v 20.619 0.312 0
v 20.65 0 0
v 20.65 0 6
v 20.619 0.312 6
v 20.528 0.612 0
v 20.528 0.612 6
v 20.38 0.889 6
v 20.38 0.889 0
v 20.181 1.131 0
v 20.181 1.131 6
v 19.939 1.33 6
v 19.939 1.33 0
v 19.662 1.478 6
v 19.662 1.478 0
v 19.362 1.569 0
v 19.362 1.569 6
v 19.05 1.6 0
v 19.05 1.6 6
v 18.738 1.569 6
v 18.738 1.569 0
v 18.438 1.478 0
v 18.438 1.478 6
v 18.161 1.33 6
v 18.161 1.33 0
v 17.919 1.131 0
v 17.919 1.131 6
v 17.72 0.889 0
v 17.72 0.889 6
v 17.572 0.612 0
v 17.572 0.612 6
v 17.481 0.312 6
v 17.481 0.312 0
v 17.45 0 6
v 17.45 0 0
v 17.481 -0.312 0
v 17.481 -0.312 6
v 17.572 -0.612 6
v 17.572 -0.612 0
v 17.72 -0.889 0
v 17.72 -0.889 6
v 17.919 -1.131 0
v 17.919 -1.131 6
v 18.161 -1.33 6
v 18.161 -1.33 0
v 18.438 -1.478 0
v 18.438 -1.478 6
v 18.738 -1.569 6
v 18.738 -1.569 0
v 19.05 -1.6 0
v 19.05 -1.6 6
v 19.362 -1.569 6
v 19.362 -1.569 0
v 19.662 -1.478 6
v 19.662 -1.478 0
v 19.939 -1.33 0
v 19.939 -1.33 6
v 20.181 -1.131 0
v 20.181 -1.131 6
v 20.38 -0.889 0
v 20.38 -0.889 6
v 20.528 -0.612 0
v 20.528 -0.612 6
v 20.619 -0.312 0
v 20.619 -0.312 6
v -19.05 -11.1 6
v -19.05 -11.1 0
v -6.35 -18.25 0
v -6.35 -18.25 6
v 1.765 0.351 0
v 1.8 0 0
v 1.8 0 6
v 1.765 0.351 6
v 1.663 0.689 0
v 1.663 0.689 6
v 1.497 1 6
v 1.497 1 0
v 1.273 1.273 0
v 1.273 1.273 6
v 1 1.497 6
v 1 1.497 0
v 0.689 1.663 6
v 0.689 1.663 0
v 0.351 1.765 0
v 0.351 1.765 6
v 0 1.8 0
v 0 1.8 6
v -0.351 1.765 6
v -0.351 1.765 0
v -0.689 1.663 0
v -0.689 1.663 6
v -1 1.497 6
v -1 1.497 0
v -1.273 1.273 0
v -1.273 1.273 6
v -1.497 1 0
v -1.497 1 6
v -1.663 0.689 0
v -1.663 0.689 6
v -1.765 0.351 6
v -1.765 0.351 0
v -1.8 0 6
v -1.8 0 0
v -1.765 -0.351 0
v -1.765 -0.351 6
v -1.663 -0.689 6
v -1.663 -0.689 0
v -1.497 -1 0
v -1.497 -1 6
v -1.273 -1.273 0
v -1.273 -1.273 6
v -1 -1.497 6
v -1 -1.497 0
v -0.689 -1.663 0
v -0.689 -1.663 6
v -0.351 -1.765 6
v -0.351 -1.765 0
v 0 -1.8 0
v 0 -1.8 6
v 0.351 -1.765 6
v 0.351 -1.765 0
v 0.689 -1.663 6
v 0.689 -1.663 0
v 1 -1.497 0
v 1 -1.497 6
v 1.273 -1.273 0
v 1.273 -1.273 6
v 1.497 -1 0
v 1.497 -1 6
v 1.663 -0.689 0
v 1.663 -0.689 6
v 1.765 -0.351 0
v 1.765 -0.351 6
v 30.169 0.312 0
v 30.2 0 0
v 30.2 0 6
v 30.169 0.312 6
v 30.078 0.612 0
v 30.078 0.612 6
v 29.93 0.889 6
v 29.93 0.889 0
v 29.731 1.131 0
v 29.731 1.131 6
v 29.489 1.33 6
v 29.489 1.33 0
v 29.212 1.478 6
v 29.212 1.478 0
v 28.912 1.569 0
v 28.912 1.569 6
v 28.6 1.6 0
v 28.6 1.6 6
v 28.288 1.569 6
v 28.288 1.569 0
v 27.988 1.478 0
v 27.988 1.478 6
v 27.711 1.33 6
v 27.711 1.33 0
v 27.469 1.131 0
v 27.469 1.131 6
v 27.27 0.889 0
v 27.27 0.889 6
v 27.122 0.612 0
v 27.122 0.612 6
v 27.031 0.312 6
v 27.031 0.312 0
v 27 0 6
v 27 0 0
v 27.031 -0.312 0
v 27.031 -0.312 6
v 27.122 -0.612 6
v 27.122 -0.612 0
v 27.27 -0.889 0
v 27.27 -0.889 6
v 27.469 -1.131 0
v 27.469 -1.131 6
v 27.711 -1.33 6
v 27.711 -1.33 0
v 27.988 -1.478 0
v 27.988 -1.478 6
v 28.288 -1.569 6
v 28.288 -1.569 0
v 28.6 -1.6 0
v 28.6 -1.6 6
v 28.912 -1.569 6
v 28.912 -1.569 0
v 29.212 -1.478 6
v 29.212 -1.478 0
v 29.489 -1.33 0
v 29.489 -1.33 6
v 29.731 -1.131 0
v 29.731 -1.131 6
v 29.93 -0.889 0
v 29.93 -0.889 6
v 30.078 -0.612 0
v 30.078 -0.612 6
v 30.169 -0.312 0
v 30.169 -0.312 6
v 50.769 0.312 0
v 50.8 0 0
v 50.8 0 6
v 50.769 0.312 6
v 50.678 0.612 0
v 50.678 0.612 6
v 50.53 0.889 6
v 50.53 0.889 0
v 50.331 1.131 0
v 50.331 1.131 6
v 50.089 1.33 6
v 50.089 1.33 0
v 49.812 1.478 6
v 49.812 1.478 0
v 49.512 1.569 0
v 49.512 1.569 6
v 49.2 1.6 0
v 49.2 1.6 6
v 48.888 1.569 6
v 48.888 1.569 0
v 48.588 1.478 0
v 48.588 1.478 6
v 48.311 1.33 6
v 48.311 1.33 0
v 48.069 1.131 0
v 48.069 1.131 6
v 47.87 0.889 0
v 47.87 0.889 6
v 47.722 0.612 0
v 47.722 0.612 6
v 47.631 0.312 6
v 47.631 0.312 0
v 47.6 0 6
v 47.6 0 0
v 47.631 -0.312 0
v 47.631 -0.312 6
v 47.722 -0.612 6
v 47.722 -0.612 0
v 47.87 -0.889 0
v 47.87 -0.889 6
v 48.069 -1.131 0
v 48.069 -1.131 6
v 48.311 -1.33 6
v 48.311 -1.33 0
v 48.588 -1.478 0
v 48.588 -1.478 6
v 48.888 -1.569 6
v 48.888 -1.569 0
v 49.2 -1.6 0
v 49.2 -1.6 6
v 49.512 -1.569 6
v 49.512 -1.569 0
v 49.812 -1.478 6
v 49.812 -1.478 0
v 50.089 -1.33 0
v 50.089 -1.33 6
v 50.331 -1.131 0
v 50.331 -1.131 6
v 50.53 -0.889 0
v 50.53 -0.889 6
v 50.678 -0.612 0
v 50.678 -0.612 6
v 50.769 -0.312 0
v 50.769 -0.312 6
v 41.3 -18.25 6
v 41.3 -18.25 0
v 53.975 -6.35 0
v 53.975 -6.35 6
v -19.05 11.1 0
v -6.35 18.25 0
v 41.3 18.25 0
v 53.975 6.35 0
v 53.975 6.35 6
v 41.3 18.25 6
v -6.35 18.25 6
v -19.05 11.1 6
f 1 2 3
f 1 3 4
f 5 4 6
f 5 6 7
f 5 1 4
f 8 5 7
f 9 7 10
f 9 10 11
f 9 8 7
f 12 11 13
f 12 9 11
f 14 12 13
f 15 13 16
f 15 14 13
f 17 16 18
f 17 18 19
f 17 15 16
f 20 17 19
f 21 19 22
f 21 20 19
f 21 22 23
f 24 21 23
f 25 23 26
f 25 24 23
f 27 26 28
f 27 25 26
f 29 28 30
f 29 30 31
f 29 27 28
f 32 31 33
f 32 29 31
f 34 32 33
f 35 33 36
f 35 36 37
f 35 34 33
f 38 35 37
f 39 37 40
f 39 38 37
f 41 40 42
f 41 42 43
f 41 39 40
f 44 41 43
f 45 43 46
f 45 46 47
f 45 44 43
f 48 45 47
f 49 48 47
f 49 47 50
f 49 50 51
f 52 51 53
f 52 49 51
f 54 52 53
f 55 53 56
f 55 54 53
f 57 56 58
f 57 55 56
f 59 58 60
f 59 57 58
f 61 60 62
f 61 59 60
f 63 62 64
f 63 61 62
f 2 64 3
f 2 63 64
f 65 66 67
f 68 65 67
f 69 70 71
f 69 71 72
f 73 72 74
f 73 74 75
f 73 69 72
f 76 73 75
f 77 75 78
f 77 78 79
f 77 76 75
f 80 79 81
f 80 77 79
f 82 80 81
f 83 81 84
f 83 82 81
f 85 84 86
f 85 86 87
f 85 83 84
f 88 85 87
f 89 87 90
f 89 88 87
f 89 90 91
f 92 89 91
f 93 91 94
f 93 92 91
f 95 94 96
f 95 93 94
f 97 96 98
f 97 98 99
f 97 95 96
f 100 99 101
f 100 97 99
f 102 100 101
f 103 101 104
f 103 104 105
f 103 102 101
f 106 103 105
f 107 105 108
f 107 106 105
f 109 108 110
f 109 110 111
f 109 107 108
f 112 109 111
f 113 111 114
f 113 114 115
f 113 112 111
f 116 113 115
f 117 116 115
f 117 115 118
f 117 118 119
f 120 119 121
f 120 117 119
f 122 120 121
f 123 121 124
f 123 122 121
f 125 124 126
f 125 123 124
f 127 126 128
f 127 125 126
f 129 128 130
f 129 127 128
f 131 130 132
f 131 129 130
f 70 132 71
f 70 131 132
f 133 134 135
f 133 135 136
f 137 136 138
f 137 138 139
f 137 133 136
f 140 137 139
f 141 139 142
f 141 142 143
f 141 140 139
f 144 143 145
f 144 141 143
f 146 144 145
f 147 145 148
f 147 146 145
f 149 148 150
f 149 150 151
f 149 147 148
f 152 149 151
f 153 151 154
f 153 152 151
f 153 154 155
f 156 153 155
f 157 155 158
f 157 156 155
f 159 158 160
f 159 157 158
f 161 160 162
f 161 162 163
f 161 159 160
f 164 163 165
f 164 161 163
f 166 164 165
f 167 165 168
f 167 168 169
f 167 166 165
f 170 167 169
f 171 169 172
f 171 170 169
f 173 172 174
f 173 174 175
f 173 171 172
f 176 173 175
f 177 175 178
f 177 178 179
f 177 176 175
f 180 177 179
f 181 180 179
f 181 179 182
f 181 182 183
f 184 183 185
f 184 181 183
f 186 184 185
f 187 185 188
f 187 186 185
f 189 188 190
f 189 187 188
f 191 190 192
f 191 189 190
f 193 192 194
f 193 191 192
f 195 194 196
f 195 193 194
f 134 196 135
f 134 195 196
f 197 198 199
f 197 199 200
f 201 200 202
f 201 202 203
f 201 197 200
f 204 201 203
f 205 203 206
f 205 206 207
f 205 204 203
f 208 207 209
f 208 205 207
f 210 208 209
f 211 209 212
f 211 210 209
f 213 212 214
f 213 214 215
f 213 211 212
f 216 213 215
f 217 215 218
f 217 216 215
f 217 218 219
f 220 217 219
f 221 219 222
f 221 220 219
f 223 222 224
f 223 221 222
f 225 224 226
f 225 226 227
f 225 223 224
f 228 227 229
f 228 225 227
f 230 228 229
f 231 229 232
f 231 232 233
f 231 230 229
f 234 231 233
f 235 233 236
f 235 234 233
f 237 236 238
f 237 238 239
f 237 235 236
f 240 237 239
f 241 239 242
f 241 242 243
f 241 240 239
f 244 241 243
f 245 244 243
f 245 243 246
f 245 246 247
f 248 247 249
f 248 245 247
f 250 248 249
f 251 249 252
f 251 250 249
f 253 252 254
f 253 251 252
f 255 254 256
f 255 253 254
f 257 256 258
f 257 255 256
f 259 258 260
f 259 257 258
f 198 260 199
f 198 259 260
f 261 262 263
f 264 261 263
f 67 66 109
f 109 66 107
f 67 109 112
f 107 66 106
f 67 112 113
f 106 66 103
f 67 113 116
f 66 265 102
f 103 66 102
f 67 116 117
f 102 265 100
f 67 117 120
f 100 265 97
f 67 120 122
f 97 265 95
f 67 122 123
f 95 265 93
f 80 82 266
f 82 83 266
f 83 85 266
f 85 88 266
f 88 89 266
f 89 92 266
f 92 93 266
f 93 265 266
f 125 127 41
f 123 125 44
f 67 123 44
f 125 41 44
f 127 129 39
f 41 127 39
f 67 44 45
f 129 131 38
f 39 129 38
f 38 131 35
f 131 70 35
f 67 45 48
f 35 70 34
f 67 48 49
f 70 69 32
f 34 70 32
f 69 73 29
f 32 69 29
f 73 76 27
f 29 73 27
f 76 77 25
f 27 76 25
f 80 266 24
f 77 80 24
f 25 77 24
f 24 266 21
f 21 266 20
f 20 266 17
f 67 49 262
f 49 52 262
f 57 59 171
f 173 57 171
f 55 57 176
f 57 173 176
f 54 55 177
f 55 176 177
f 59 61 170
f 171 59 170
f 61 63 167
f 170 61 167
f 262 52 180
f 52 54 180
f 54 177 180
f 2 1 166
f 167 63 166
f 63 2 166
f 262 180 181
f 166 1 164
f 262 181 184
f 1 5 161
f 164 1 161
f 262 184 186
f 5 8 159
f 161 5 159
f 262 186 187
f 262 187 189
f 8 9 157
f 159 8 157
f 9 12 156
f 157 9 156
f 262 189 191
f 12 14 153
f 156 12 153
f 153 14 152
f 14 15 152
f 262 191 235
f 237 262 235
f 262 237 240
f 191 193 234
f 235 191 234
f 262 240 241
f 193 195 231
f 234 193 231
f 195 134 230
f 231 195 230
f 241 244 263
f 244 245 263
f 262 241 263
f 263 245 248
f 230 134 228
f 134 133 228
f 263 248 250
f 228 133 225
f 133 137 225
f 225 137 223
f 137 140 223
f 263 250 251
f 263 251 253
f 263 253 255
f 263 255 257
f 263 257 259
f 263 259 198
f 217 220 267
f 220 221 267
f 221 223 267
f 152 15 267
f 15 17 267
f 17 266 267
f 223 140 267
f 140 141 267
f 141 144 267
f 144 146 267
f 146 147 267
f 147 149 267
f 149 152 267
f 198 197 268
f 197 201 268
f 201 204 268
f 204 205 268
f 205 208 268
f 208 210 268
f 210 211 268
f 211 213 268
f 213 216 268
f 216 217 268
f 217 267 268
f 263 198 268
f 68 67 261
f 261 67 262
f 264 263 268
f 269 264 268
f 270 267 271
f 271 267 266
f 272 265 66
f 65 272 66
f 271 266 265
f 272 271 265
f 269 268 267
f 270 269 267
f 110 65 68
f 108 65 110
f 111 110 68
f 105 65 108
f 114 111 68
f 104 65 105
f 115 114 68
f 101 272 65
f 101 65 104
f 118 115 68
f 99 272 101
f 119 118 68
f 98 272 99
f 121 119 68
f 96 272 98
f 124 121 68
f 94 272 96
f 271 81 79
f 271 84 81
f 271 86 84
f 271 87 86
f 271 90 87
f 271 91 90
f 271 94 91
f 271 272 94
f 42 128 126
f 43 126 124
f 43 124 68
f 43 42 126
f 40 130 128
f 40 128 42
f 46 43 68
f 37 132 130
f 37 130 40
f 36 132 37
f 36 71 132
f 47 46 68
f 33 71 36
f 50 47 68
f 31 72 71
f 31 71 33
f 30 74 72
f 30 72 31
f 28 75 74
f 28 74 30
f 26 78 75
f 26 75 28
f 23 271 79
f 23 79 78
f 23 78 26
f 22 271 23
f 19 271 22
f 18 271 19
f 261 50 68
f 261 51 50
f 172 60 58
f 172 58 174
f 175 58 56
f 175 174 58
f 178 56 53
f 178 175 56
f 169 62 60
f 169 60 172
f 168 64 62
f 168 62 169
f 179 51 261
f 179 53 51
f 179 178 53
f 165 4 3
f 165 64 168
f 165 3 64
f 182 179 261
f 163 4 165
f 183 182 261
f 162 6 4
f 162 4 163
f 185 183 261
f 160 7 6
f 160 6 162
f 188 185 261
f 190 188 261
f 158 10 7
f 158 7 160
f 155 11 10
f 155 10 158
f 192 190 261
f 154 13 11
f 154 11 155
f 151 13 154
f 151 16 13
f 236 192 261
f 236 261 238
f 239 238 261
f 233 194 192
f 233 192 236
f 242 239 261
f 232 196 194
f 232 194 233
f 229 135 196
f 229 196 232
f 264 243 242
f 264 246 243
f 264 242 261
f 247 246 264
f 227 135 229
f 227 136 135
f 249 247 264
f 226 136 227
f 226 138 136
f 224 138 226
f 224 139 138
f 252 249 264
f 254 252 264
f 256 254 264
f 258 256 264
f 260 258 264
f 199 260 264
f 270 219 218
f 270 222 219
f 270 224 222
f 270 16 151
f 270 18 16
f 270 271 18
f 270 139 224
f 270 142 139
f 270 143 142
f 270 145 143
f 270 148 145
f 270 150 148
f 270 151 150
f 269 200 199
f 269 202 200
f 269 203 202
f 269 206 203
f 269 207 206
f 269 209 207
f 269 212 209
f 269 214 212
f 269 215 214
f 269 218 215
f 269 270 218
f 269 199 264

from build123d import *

# Parameters (mm, degrees)
SKETCH1_R           = 1.6
SKETCH1_R_2         = 1.8
BOSS_EXTRUDE1_DEPTH = 6


with BuildPart() as part:
    # Sketch1 → Boss-Extrude1 (new body)
    with BuildSketch(Plane.XY):
        Polygon((-19.05, -11.1), (-6.35, -18.25), (41.3, -18.25), (53.975, -6.35), (53.975, 6.35), (41.3, 18.25), (-6.35, 18.25), (-19.05, 11.1), align=None)
        with Locations((19.05, 0)):
            Circle(SKETCH1_R, mode=Mode.SUBTRACT)
        with Locations((28.6, 0)):
            Circle(SKETCH1_R, mode=Mode.SUBTRACT)
        with Locations((49.2, 0)):
            Circle(SKETCH1_R, mode=Mode.SUBTRACT)
        Circle(SKETCH1_R_2, mode=Mode.SUBTRACT)
    extrude(amount=BOSS_EXTRUDE1_DEPTH)


solid = part.part
